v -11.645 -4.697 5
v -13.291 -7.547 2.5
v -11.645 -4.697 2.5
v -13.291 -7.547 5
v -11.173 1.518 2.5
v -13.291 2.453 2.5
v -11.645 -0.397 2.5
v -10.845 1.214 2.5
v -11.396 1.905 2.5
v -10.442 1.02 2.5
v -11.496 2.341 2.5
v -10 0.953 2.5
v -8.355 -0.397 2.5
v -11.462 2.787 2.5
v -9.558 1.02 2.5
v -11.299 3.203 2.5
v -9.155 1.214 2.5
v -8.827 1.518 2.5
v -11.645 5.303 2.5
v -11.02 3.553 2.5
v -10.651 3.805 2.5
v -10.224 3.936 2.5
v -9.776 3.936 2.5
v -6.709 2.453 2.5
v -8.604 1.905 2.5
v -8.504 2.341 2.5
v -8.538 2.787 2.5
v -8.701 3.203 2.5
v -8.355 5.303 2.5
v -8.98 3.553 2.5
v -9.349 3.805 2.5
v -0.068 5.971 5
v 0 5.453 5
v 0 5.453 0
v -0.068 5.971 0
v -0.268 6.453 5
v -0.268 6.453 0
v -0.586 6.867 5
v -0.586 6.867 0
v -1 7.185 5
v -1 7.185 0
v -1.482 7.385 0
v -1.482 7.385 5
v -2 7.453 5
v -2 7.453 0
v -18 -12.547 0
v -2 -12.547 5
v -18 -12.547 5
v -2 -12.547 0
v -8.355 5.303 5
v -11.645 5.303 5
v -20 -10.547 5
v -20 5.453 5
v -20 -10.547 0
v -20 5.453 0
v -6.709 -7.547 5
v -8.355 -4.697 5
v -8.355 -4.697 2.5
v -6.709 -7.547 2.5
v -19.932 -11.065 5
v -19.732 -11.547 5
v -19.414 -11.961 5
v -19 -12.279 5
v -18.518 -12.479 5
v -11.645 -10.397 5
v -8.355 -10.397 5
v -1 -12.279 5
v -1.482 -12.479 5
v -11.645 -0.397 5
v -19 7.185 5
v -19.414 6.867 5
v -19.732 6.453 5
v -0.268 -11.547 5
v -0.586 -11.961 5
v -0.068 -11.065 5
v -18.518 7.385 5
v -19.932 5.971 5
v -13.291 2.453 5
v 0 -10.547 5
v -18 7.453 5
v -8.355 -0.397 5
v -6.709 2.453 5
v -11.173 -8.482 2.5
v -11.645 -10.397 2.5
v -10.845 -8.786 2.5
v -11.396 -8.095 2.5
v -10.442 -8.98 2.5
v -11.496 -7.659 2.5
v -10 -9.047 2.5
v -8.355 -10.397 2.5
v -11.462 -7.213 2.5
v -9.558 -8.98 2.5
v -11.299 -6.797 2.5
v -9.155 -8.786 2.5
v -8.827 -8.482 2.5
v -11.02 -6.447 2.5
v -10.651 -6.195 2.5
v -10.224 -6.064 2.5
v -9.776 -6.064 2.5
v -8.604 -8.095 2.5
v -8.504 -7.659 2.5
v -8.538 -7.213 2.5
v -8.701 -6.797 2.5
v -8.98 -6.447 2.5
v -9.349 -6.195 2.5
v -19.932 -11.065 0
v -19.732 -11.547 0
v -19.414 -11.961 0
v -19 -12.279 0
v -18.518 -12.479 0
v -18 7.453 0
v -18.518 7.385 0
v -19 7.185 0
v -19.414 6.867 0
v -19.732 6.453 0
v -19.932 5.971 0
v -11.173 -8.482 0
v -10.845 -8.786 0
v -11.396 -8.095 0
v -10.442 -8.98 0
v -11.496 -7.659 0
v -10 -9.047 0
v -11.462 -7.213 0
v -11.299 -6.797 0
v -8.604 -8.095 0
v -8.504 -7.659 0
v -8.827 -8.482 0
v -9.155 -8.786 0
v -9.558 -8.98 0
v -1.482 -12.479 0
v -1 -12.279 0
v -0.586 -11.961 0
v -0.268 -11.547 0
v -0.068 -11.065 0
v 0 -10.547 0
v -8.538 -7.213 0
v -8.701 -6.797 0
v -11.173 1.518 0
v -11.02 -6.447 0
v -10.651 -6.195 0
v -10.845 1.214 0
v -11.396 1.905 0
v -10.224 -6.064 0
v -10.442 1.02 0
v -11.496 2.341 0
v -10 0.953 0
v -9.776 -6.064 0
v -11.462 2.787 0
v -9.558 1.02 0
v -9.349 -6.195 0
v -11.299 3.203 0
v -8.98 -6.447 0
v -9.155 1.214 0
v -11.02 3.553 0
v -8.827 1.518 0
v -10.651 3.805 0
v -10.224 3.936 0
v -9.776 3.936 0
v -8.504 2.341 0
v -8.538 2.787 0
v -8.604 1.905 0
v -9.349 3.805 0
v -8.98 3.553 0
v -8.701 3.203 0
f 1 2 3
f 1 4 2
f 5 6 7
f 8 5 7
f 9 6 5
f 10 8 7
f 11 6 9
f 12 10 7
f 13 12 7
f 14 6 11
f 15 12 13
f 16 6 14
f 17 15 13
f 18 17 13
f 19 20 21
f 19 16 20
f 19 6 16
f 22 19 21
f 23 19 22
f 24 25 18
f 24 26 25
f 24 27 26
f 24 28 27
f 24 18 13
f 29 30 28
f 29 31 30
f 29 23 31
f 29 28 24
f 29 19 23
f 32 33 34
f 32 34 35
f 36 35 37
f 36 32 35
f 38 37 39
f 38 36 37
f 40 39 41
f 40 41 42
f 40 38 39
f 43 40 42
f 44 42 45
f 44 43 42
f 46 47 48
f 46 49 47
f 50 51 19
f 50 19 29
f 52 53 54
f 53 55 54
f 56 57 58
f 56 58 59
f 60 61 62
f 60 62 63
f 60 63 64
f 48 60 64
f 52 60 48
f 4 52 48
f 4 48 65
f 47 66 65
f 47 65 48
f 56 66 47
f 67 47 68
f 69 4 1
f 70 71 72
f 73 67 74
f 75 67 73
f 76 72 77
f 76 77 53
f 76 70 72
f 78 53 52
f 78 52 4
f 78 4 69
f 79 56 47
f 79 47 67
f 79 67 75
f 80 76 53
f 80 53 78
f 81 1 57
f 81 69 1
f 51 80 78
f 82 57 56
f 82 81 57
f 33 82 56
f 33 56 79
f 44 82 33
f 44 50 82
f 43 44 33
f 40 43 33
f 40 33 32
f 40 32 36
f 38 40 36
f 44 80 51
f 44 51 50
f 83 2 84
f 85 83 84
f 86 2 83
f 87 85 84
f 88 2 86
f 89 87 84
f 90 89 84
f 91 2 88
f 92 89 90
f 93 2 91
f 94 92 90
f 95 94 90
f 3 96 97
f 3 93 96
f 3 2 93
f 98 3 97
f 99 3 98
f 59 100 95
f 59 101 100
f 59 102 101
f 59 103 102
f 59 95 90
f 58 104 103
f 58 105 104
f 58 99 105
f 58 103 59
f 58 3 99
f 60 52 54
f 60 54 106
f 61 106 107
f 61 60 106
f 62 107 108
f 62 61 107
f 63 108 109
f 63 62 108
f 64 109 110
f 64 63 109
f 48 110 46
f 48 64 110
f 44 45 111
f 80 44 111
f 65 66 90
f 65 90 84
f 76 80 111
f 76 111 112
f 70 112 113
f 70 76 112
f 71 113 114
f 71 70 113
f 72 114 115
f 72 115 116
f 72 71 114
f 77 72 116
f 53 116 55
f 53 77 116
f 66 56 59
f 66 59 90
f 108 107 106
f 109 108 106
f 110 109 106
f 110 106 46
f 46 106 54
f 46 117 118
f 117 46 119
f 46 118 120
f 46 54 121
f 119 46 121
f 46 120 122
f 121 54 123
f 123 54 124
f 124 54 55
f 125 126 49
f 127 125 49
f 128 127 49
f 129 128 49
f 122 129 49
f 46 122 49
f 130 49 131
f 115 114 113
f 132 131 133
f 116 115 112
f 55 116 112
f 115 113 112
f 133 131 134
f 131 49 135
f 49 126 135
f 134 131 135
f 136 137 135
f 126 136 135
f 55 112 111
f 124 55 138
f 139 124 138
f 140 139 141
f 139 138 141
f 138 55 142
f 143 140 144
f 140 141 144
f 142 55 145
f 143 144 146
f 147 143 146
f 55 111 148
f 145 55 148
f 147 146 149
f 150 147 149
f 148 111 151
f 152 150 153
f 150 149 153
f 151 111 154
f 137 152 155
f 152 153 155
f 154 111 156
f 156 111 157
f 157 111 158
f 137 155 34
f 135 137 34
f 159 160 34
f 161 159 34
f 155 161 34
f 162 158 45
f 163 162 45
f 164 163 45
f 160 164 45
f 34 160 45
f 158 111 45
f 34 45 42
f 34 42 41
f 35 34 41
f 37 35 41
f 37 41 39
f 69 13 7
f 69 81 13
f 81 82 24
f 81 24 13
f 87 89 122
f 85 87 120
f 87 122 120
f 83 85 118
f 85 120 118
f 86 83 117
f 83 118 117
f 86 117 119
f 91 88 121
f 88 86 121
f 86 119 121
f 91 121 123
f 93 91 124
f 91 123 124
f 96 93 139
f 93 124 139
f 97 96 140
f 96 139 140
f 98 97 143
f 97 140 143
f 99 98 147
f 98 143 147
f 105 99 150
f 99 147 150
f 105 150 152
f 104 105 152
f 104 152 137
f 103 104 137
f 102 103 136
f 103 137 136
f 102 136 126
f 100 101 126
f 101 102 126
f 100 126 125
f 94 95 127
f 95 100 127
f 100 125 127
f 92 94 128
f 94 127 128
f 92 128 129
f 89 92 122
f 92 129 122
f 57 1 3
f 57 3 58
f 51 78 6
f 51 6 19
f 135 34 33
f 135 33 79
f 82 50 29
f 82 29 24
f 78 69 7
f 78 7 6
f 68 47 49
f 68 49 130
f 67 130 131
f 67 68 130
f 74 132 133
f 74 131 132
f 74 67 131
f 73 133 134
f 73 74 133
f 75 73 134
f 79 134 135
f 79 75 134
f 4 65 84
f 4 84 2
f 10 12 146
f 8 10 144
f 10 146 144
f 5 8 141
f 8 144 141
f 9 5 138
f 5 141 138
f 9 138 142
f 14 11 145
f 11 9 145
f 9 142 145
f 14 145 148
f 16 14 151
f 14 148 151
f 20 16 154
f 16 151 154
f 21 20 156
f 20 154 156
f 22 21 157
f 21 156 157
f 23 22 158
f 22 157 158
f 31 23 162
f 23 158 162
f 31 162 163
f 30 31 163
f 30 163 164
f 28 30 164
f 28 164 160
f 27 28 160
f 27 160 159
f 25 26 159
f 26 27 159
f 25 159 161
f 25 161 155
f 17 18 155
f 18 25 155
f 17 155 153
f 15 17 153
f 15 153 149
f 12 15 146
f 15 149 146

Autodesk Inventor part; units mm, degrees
ref_plane "YZ Plane" through (0, 0, 0) normal (1, 0, 0) x (0, 1, 0)
ref_plane "XZ Plane" through (0, 0, 0) normal (0, 1, 0) x (-1, 0, 0)
ref_plane "XY Plane" through (0, 0, 0) normal (0, 0, 1) x (1, 0, 0)
ref_plane "Work Plane1" through (0, 0, 0) normal (0, 0, 1) x (1, 0, 0)
sketch "Sketch1" plane through (0, 0, 0) normal (0, 0, 1) x (1, 0, 0)
  line L0 (7.4216, 7.4531) -> (-20, 7.4531) projected
  line L1 (-20, 7.4531) -> (-20, -9.4531) projected
  line L2 (20, -9.4531) -> (-20, -9.4531) projected
  line L3 (20, -4.1939) -> (20, -9.4531) projected
  line L4 (-20, 7.4531) -> (0, 7.4531)
  line L5 (0, 7.4531) -> (0, -12.5469)
  line L6 (0, -12.5469) -> (-20, -12.5469)
  line L7 (-20, -12.5469) -> (-20, 7.4531)
  arc A0 (8.8358, 6.8673) -> (7.4216, 7.4531) centre (7.4216, 5.4531) ccw projected
  arc A1 (19.5704, -3.8673) -> (20, -4.1939) centre (20.9847, -2.4531) ccw projected
  line L8 (8.8358, 6.8673) -> (19.5704, -3.8673) projected
  point P0 (0, 0)
  dimension "d0" = 20
  dimension "d1" = 20
extrude "Extrusion1" add sketch "Sketch1" along normal blind 5 contours L5 L2 L1 L0 | L5 L6 L7 L2
fillet "Fillet1" radius 2 4 edges at (0, 7.4531, 2.5) (0, -12.5469, 2.5) (-20, 7.4531, 2.5) (-20, -12.5469, 2.5)
sketch "Sketch2" plane through (0, 0, 5) normal (0, 0, 1) x (1, 0, 0)
  line L0 (-5.26, -4.4531) -> (-16.3573, -5.4531) projected
  arc A0 (-20, -10.5469) -> (-18, -12.5469) centre (-18, -10.5469) ccw projected
  line L1 (-18, -12.5469) -> (-2, -12.5469) projected
  arc A1 (-2, -12.5469) -> (0, -10.5469) centre (-2, -10.5469) ccw projected
  line L2 (0, -10.5469) -> (0, 5.4531) projected
  arc A2 (0, 5.4531) -> (-2, 7.4531) centre (-2, 5.4531) ccw projected
  line L3 (-2, 7.4531) -> (-18, 7.4531) projected
  arc A3 (-18, 7.4531) -> (-20, 5.4531) centre (-18, 5.4531) ccw projected
  line L4 (-20, 5.4531) -> (-20, -10.5469) projected
  line L5 (-10, -12.5469) -> (-10, 7.4531) construction
  line L6 (-2, 7.4531) -> (-18, 7.4531) construction
  line L7 (-10, -2.5469) -> (-10, 2.4531) construction
  line L8 (-10, 2.4531) -> (-10, -7.5469) construction
  point P0 (0, 0)
  dimension "d5" = 5
  dimension "d6" = 10
hole "Hole1" at (-10, 2.4531, 5) at (-10, -7.5469, 5) direction (0, 0, -1) diameter 3 end through all
sketch "Sketch3" plane through (0, 0, 5) normal (0, 0, 1) x (1, 0, 0)
  circle A0 centre (-10, 2.4531) radius 1.5 projected
  circle A1 centre (-10, -7.5469) radius 1.5 projected
  line L0 (-6.7091, 2.4531) -> (-8.3546, -0.3969)
  line L1 (-8.3546, -0.3969) -> (-11.6454, -0.3969)
  line L2 (-11.6454, -0.3969) -> (-13.2909, 2.4531)
  line L3 (-13.2909, 2.4531) -> (-11.6454, 5.3031)
  line L4 (-11.6454, 5.3031) -> (-8.3546, 5.3031)
  line L5 (-8.3546, 5.3031) -> (-6.7091, 2.4531)
  line L6 (-6.7091, -7.5469) -> (-8.3546, -10.3969)
  line L7 (-8.3546, -10.3969) -> (-11.6454, -10.3969)
  line L8 (-11.6454, -10.3969) -> (-13.2909, -7.5469)
  line L9 (-13.2909, -7.5469) -> (-11.6454, -4.6969)
  line L10 (-11.6454, -4.6969) -> (-8.3546, -4.6969)
  line L11 (-8.3546, -4.6969) -> (-6.7091, -7.5469)
  point P0 (0, 0)
  dimension "d14" = 5.7
extrude "Extrusion2" cut sketch "Sketch3" against normal blind 2.5
properties part number "little_holder"
